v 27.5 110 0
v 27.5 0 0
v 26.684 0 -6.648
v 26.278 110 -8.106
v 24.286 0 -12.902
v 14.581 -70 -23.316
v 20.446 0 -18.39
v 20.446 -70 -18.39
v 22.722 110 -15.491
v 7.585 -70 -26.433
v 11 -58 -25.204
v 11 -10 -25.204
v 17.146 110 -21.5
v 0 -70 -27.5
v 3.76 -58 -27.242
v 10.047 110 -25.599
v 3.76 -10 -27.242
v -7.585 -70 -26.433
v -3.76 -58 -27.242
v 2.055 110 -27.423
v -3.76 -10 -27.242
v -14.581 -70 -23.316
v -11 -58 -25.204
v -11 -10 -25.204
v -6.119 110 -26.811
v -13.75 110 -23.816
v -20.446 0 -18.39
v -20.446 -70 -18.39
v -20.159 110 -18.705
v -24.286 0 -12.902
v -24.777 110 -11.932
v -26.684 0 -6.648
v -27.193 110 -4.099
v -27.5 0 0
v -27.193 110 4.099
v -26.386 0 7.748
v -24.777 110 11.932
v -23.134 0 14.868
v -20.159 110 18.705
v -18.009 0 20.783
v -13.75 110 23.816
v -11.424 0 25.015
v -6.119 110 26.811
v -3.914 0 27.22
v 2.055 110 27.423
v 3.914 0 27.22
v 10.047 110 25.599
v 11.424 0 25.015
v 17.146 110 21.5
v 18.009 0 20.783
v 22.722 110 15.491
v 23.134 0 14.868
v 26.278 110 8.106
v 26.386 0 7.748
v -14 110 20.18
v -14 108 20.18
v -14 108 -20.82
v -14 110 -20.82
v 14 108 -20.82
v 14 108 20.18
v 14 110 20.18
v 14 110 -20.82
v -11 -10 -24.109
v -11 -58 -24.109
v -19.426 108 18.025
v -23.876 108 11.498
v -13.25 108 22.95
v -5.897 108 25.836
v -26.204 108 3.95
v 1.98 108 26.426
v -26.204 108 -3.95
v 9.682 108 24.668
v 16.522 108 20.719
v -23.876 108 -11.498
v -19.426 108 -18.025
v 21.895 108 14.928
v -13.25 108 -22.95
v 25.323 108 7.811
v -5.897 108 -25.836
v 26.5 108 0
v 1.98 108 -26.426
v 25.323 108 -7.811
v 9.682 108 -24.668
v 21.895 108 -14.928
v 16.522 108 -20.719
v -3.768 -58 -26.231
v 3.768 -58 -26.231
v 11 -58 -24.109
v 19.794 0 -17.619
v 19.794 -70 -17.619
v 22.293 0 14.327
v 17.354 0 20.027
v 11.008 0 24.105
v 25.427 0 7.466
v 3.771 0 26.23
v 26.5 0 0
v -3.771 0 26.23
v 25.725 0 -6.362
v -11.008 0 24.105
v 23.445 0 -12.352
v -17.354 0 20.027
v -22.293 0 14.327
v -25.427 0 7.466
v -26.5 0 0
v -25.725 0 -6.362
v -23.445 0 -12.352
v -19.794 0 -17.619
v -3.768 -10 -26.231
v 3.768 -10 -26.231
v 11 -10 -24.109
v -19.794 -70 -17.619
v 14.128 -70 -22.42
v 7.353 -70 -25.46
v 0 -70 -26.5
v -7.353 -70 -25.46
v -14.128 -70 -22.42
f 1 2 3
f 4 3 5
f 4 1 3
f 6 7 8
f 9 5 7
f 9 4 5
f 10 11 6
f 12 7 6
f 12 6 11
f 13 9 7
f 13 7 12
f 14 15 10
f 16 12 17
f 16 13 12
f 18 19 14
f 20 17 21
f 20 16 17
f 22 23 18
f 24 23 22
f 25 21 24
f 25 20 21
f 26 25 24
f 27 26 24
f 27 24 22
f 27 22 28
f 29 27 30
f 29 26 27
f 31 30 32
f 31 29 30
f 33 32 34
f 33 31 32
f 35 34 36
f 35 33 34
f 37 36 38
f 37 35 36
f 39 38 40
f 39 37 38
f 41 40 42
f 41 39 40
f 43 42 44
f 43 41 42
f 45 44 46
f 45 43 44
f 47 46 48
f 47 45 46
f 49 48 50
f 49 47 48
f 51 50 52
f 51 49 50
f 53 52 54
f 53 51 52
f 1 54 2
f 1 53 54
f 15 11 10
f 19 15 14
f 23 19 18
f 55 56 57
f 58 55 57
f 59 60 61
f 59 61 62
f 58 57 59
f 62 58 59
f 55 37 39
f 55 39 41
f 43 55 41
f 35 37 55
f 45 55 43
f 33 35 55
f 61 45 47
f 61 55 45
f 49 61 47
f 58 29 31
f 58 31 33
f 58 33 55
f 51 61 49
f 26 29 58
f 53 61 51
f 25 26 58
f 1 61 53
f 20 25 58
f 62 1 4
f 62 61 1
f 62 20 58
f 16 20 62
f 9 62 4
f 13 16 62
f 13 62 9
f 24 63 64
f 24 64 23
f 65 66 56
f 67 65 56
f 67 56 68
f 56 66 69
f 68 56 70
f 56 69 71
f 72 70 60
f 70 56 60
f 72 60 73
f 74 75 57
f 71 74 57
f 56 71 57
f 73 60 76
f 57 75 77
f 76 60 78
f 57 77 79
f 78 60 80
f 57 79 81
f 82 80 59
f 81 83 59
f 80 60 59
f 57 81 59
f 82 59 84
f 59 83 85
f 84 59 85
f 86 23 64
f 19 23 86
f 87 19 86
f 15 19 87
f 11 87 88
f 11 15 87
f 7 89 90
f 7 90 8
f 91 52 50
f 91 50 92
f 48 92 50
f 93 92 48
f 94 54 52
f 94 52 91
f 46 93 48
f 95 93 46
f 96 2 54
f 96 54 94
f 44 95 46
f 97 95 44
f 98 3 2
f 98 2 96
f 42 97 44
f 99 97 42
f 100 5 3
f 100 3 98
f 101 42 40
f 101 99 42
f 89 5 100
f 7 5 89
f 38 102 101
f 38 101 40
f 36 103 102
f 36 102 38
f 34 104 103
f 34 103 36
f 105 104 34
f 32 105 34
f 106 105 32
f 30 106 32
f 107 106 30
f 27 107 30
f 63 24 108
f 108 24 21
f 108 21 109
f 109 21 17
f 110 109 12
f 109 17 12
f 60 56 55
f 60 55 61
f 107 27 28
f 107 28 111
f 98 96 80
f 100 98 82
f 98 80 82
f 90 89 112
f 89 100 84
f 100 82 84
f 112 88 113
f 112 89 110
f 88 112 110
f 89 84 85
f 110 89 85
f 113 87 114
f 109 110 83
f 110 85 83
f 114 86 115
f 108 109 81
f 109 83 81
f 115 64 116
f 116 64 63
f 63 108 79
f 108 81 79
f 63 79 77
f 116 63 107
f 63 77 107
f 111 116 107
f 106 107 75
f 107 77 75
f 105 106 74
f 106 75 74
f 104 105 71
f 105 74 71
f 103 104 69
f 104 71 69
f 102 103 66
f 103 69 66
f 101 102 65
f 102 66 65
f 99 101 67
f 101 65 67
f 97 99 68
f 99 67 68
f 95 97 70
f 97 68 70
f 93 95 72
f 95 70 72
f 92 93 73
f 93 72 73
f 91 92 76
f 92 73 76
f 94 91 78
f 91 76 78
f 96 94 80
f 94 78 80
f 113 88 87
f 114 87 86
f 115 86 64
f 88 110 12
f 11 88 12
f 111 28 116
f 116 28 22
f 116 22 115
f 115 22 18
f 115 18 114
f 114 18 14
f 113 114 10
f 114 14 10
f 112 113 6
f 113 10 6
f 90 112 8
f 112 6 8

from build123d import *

# Parameters (mm, degrees)
SKETCH_1_R               = 27.5
EXTRUDE_1_DEPTH          = 110
EXTRUDE_1_DEPTH_BACK     = 70
SKETCH_2_R               = 26.5
CUT_EXTRUDE_1_DEPTH      = 108
CUT_EXTRUDE_1_DEPTH_BACK = 70
CUT_EXTRUDE_6_DEPTH      = 70
SKETCH_7_W               = 22
SKETCH_7_H               = 20
CUT_EXTRUDE_7_DEPTH      = 48
SKETCH_8_W               = 28
SKETCH_8_H               = 41
CUT_EXTRUDE_8_DEPTH      = 119


with BuildPart() as part:
    # 草圖1 → 填料-伸長1 (new body, two sides)
    with BuildSketch(Plane(origin=(0, 0, 0), x_dir=(1, 0, 0), z_dir=(0, 1, 0))) as extrude_1_sk:
        Circle(SKETCH_1_R)
    extrude(amount=EXTRUDE_1_DEPTH)
    extrude(extrude_1_sk.sketch, amount=-EXTRUDE_1_DEPTH_BACK)

    # 草圖2 → 除料-伸長1 (cut, two sides)
    with BuildSketch(Plane(origin=(0, 0, 0), x_dir=(1, 0, 0), z_dir=(0, 1, 0))) as cut_extrude_1_sk:
        Circle(SKETCH_2_R)
    extrude(amount=CUT_EXTRUDE_1_DEPTH, mode=Mode.SUBTRACT)
    extrude(cut_extrude_1_sk.sketch, amount=-CUT_EXTRUDE_1_DEPTH_BACK, mode=Mode.SUBTRACT)

    # 草圖6 → 除料-伸長6 (cut)
    with BuildSketch(Plane(origin=(0, 0, 0), x_dir=(1, 0, 0), z_dir=(0, 1, 0))):
        with BuildLine():
            Line((-26.5, 0), (26.300758937, 0))
            Line((26.300758937, 0), (26.5, 0))
            ThreePointArc((26.5, 0), (24.766835815, 9.426231681), (19.794049532, 17.619466595))
            Line((19.794049532, 17.619466595), (20.446397381, 18.390074337))
            ThreePointArc((20.446397381, 18.390074337), (25.676116607, 9.848199633), (27.5, 0))
            ThreePointArc((27.5, 0), (0, -27.5), (-27.5, 0))
            ThreePointArc((-27.5, 0), (-25.676116607, 9.848199633), (-20.446397381, 18.390074337))
            Line((-20.446397381, 18.390074337), (-19.794049532, 17.619466595))
            ThreePointArc((-19.794049532, 17.619466595), (-24.766835815, 9.426231681), (-26.5, 0))
        make_face()
    extrude(amount=-CUT_EXTRUDE_6_DEPTH, mode=Mode.SUBTRACT)

    # 草圖7 → 除料-伸長7 (cut)
    with BuildSketch(Plane(origin=(0, -10, 0), x_dir=(1, 0, 0), z_dir=(0, 1, 0))):
        with Locations((0, 27.910624132)):
            Rectangle(SKETCH_7_W, SKETCH_7_H)
    extrude(amount=-CUT_EXTRUDE_7_DEPTH, mode=Mode.SUBTRACT)

    # 草圖8 → 除料-伸長8 (cut)
    with BuildSketch(Plane(origin=(0, 0, 0), x_dir=(1, 0, 0), z_dir=(0, 1, 0))):
        with Locations((0, 0.320473431)):
            Rectangle(SKETCH_8_W, SKETCH_8_H)
    extrude(amount=CUT_EXTRUDE_8_DEPTH, mode=Mode.SUBTRACT)


solid = part.part
